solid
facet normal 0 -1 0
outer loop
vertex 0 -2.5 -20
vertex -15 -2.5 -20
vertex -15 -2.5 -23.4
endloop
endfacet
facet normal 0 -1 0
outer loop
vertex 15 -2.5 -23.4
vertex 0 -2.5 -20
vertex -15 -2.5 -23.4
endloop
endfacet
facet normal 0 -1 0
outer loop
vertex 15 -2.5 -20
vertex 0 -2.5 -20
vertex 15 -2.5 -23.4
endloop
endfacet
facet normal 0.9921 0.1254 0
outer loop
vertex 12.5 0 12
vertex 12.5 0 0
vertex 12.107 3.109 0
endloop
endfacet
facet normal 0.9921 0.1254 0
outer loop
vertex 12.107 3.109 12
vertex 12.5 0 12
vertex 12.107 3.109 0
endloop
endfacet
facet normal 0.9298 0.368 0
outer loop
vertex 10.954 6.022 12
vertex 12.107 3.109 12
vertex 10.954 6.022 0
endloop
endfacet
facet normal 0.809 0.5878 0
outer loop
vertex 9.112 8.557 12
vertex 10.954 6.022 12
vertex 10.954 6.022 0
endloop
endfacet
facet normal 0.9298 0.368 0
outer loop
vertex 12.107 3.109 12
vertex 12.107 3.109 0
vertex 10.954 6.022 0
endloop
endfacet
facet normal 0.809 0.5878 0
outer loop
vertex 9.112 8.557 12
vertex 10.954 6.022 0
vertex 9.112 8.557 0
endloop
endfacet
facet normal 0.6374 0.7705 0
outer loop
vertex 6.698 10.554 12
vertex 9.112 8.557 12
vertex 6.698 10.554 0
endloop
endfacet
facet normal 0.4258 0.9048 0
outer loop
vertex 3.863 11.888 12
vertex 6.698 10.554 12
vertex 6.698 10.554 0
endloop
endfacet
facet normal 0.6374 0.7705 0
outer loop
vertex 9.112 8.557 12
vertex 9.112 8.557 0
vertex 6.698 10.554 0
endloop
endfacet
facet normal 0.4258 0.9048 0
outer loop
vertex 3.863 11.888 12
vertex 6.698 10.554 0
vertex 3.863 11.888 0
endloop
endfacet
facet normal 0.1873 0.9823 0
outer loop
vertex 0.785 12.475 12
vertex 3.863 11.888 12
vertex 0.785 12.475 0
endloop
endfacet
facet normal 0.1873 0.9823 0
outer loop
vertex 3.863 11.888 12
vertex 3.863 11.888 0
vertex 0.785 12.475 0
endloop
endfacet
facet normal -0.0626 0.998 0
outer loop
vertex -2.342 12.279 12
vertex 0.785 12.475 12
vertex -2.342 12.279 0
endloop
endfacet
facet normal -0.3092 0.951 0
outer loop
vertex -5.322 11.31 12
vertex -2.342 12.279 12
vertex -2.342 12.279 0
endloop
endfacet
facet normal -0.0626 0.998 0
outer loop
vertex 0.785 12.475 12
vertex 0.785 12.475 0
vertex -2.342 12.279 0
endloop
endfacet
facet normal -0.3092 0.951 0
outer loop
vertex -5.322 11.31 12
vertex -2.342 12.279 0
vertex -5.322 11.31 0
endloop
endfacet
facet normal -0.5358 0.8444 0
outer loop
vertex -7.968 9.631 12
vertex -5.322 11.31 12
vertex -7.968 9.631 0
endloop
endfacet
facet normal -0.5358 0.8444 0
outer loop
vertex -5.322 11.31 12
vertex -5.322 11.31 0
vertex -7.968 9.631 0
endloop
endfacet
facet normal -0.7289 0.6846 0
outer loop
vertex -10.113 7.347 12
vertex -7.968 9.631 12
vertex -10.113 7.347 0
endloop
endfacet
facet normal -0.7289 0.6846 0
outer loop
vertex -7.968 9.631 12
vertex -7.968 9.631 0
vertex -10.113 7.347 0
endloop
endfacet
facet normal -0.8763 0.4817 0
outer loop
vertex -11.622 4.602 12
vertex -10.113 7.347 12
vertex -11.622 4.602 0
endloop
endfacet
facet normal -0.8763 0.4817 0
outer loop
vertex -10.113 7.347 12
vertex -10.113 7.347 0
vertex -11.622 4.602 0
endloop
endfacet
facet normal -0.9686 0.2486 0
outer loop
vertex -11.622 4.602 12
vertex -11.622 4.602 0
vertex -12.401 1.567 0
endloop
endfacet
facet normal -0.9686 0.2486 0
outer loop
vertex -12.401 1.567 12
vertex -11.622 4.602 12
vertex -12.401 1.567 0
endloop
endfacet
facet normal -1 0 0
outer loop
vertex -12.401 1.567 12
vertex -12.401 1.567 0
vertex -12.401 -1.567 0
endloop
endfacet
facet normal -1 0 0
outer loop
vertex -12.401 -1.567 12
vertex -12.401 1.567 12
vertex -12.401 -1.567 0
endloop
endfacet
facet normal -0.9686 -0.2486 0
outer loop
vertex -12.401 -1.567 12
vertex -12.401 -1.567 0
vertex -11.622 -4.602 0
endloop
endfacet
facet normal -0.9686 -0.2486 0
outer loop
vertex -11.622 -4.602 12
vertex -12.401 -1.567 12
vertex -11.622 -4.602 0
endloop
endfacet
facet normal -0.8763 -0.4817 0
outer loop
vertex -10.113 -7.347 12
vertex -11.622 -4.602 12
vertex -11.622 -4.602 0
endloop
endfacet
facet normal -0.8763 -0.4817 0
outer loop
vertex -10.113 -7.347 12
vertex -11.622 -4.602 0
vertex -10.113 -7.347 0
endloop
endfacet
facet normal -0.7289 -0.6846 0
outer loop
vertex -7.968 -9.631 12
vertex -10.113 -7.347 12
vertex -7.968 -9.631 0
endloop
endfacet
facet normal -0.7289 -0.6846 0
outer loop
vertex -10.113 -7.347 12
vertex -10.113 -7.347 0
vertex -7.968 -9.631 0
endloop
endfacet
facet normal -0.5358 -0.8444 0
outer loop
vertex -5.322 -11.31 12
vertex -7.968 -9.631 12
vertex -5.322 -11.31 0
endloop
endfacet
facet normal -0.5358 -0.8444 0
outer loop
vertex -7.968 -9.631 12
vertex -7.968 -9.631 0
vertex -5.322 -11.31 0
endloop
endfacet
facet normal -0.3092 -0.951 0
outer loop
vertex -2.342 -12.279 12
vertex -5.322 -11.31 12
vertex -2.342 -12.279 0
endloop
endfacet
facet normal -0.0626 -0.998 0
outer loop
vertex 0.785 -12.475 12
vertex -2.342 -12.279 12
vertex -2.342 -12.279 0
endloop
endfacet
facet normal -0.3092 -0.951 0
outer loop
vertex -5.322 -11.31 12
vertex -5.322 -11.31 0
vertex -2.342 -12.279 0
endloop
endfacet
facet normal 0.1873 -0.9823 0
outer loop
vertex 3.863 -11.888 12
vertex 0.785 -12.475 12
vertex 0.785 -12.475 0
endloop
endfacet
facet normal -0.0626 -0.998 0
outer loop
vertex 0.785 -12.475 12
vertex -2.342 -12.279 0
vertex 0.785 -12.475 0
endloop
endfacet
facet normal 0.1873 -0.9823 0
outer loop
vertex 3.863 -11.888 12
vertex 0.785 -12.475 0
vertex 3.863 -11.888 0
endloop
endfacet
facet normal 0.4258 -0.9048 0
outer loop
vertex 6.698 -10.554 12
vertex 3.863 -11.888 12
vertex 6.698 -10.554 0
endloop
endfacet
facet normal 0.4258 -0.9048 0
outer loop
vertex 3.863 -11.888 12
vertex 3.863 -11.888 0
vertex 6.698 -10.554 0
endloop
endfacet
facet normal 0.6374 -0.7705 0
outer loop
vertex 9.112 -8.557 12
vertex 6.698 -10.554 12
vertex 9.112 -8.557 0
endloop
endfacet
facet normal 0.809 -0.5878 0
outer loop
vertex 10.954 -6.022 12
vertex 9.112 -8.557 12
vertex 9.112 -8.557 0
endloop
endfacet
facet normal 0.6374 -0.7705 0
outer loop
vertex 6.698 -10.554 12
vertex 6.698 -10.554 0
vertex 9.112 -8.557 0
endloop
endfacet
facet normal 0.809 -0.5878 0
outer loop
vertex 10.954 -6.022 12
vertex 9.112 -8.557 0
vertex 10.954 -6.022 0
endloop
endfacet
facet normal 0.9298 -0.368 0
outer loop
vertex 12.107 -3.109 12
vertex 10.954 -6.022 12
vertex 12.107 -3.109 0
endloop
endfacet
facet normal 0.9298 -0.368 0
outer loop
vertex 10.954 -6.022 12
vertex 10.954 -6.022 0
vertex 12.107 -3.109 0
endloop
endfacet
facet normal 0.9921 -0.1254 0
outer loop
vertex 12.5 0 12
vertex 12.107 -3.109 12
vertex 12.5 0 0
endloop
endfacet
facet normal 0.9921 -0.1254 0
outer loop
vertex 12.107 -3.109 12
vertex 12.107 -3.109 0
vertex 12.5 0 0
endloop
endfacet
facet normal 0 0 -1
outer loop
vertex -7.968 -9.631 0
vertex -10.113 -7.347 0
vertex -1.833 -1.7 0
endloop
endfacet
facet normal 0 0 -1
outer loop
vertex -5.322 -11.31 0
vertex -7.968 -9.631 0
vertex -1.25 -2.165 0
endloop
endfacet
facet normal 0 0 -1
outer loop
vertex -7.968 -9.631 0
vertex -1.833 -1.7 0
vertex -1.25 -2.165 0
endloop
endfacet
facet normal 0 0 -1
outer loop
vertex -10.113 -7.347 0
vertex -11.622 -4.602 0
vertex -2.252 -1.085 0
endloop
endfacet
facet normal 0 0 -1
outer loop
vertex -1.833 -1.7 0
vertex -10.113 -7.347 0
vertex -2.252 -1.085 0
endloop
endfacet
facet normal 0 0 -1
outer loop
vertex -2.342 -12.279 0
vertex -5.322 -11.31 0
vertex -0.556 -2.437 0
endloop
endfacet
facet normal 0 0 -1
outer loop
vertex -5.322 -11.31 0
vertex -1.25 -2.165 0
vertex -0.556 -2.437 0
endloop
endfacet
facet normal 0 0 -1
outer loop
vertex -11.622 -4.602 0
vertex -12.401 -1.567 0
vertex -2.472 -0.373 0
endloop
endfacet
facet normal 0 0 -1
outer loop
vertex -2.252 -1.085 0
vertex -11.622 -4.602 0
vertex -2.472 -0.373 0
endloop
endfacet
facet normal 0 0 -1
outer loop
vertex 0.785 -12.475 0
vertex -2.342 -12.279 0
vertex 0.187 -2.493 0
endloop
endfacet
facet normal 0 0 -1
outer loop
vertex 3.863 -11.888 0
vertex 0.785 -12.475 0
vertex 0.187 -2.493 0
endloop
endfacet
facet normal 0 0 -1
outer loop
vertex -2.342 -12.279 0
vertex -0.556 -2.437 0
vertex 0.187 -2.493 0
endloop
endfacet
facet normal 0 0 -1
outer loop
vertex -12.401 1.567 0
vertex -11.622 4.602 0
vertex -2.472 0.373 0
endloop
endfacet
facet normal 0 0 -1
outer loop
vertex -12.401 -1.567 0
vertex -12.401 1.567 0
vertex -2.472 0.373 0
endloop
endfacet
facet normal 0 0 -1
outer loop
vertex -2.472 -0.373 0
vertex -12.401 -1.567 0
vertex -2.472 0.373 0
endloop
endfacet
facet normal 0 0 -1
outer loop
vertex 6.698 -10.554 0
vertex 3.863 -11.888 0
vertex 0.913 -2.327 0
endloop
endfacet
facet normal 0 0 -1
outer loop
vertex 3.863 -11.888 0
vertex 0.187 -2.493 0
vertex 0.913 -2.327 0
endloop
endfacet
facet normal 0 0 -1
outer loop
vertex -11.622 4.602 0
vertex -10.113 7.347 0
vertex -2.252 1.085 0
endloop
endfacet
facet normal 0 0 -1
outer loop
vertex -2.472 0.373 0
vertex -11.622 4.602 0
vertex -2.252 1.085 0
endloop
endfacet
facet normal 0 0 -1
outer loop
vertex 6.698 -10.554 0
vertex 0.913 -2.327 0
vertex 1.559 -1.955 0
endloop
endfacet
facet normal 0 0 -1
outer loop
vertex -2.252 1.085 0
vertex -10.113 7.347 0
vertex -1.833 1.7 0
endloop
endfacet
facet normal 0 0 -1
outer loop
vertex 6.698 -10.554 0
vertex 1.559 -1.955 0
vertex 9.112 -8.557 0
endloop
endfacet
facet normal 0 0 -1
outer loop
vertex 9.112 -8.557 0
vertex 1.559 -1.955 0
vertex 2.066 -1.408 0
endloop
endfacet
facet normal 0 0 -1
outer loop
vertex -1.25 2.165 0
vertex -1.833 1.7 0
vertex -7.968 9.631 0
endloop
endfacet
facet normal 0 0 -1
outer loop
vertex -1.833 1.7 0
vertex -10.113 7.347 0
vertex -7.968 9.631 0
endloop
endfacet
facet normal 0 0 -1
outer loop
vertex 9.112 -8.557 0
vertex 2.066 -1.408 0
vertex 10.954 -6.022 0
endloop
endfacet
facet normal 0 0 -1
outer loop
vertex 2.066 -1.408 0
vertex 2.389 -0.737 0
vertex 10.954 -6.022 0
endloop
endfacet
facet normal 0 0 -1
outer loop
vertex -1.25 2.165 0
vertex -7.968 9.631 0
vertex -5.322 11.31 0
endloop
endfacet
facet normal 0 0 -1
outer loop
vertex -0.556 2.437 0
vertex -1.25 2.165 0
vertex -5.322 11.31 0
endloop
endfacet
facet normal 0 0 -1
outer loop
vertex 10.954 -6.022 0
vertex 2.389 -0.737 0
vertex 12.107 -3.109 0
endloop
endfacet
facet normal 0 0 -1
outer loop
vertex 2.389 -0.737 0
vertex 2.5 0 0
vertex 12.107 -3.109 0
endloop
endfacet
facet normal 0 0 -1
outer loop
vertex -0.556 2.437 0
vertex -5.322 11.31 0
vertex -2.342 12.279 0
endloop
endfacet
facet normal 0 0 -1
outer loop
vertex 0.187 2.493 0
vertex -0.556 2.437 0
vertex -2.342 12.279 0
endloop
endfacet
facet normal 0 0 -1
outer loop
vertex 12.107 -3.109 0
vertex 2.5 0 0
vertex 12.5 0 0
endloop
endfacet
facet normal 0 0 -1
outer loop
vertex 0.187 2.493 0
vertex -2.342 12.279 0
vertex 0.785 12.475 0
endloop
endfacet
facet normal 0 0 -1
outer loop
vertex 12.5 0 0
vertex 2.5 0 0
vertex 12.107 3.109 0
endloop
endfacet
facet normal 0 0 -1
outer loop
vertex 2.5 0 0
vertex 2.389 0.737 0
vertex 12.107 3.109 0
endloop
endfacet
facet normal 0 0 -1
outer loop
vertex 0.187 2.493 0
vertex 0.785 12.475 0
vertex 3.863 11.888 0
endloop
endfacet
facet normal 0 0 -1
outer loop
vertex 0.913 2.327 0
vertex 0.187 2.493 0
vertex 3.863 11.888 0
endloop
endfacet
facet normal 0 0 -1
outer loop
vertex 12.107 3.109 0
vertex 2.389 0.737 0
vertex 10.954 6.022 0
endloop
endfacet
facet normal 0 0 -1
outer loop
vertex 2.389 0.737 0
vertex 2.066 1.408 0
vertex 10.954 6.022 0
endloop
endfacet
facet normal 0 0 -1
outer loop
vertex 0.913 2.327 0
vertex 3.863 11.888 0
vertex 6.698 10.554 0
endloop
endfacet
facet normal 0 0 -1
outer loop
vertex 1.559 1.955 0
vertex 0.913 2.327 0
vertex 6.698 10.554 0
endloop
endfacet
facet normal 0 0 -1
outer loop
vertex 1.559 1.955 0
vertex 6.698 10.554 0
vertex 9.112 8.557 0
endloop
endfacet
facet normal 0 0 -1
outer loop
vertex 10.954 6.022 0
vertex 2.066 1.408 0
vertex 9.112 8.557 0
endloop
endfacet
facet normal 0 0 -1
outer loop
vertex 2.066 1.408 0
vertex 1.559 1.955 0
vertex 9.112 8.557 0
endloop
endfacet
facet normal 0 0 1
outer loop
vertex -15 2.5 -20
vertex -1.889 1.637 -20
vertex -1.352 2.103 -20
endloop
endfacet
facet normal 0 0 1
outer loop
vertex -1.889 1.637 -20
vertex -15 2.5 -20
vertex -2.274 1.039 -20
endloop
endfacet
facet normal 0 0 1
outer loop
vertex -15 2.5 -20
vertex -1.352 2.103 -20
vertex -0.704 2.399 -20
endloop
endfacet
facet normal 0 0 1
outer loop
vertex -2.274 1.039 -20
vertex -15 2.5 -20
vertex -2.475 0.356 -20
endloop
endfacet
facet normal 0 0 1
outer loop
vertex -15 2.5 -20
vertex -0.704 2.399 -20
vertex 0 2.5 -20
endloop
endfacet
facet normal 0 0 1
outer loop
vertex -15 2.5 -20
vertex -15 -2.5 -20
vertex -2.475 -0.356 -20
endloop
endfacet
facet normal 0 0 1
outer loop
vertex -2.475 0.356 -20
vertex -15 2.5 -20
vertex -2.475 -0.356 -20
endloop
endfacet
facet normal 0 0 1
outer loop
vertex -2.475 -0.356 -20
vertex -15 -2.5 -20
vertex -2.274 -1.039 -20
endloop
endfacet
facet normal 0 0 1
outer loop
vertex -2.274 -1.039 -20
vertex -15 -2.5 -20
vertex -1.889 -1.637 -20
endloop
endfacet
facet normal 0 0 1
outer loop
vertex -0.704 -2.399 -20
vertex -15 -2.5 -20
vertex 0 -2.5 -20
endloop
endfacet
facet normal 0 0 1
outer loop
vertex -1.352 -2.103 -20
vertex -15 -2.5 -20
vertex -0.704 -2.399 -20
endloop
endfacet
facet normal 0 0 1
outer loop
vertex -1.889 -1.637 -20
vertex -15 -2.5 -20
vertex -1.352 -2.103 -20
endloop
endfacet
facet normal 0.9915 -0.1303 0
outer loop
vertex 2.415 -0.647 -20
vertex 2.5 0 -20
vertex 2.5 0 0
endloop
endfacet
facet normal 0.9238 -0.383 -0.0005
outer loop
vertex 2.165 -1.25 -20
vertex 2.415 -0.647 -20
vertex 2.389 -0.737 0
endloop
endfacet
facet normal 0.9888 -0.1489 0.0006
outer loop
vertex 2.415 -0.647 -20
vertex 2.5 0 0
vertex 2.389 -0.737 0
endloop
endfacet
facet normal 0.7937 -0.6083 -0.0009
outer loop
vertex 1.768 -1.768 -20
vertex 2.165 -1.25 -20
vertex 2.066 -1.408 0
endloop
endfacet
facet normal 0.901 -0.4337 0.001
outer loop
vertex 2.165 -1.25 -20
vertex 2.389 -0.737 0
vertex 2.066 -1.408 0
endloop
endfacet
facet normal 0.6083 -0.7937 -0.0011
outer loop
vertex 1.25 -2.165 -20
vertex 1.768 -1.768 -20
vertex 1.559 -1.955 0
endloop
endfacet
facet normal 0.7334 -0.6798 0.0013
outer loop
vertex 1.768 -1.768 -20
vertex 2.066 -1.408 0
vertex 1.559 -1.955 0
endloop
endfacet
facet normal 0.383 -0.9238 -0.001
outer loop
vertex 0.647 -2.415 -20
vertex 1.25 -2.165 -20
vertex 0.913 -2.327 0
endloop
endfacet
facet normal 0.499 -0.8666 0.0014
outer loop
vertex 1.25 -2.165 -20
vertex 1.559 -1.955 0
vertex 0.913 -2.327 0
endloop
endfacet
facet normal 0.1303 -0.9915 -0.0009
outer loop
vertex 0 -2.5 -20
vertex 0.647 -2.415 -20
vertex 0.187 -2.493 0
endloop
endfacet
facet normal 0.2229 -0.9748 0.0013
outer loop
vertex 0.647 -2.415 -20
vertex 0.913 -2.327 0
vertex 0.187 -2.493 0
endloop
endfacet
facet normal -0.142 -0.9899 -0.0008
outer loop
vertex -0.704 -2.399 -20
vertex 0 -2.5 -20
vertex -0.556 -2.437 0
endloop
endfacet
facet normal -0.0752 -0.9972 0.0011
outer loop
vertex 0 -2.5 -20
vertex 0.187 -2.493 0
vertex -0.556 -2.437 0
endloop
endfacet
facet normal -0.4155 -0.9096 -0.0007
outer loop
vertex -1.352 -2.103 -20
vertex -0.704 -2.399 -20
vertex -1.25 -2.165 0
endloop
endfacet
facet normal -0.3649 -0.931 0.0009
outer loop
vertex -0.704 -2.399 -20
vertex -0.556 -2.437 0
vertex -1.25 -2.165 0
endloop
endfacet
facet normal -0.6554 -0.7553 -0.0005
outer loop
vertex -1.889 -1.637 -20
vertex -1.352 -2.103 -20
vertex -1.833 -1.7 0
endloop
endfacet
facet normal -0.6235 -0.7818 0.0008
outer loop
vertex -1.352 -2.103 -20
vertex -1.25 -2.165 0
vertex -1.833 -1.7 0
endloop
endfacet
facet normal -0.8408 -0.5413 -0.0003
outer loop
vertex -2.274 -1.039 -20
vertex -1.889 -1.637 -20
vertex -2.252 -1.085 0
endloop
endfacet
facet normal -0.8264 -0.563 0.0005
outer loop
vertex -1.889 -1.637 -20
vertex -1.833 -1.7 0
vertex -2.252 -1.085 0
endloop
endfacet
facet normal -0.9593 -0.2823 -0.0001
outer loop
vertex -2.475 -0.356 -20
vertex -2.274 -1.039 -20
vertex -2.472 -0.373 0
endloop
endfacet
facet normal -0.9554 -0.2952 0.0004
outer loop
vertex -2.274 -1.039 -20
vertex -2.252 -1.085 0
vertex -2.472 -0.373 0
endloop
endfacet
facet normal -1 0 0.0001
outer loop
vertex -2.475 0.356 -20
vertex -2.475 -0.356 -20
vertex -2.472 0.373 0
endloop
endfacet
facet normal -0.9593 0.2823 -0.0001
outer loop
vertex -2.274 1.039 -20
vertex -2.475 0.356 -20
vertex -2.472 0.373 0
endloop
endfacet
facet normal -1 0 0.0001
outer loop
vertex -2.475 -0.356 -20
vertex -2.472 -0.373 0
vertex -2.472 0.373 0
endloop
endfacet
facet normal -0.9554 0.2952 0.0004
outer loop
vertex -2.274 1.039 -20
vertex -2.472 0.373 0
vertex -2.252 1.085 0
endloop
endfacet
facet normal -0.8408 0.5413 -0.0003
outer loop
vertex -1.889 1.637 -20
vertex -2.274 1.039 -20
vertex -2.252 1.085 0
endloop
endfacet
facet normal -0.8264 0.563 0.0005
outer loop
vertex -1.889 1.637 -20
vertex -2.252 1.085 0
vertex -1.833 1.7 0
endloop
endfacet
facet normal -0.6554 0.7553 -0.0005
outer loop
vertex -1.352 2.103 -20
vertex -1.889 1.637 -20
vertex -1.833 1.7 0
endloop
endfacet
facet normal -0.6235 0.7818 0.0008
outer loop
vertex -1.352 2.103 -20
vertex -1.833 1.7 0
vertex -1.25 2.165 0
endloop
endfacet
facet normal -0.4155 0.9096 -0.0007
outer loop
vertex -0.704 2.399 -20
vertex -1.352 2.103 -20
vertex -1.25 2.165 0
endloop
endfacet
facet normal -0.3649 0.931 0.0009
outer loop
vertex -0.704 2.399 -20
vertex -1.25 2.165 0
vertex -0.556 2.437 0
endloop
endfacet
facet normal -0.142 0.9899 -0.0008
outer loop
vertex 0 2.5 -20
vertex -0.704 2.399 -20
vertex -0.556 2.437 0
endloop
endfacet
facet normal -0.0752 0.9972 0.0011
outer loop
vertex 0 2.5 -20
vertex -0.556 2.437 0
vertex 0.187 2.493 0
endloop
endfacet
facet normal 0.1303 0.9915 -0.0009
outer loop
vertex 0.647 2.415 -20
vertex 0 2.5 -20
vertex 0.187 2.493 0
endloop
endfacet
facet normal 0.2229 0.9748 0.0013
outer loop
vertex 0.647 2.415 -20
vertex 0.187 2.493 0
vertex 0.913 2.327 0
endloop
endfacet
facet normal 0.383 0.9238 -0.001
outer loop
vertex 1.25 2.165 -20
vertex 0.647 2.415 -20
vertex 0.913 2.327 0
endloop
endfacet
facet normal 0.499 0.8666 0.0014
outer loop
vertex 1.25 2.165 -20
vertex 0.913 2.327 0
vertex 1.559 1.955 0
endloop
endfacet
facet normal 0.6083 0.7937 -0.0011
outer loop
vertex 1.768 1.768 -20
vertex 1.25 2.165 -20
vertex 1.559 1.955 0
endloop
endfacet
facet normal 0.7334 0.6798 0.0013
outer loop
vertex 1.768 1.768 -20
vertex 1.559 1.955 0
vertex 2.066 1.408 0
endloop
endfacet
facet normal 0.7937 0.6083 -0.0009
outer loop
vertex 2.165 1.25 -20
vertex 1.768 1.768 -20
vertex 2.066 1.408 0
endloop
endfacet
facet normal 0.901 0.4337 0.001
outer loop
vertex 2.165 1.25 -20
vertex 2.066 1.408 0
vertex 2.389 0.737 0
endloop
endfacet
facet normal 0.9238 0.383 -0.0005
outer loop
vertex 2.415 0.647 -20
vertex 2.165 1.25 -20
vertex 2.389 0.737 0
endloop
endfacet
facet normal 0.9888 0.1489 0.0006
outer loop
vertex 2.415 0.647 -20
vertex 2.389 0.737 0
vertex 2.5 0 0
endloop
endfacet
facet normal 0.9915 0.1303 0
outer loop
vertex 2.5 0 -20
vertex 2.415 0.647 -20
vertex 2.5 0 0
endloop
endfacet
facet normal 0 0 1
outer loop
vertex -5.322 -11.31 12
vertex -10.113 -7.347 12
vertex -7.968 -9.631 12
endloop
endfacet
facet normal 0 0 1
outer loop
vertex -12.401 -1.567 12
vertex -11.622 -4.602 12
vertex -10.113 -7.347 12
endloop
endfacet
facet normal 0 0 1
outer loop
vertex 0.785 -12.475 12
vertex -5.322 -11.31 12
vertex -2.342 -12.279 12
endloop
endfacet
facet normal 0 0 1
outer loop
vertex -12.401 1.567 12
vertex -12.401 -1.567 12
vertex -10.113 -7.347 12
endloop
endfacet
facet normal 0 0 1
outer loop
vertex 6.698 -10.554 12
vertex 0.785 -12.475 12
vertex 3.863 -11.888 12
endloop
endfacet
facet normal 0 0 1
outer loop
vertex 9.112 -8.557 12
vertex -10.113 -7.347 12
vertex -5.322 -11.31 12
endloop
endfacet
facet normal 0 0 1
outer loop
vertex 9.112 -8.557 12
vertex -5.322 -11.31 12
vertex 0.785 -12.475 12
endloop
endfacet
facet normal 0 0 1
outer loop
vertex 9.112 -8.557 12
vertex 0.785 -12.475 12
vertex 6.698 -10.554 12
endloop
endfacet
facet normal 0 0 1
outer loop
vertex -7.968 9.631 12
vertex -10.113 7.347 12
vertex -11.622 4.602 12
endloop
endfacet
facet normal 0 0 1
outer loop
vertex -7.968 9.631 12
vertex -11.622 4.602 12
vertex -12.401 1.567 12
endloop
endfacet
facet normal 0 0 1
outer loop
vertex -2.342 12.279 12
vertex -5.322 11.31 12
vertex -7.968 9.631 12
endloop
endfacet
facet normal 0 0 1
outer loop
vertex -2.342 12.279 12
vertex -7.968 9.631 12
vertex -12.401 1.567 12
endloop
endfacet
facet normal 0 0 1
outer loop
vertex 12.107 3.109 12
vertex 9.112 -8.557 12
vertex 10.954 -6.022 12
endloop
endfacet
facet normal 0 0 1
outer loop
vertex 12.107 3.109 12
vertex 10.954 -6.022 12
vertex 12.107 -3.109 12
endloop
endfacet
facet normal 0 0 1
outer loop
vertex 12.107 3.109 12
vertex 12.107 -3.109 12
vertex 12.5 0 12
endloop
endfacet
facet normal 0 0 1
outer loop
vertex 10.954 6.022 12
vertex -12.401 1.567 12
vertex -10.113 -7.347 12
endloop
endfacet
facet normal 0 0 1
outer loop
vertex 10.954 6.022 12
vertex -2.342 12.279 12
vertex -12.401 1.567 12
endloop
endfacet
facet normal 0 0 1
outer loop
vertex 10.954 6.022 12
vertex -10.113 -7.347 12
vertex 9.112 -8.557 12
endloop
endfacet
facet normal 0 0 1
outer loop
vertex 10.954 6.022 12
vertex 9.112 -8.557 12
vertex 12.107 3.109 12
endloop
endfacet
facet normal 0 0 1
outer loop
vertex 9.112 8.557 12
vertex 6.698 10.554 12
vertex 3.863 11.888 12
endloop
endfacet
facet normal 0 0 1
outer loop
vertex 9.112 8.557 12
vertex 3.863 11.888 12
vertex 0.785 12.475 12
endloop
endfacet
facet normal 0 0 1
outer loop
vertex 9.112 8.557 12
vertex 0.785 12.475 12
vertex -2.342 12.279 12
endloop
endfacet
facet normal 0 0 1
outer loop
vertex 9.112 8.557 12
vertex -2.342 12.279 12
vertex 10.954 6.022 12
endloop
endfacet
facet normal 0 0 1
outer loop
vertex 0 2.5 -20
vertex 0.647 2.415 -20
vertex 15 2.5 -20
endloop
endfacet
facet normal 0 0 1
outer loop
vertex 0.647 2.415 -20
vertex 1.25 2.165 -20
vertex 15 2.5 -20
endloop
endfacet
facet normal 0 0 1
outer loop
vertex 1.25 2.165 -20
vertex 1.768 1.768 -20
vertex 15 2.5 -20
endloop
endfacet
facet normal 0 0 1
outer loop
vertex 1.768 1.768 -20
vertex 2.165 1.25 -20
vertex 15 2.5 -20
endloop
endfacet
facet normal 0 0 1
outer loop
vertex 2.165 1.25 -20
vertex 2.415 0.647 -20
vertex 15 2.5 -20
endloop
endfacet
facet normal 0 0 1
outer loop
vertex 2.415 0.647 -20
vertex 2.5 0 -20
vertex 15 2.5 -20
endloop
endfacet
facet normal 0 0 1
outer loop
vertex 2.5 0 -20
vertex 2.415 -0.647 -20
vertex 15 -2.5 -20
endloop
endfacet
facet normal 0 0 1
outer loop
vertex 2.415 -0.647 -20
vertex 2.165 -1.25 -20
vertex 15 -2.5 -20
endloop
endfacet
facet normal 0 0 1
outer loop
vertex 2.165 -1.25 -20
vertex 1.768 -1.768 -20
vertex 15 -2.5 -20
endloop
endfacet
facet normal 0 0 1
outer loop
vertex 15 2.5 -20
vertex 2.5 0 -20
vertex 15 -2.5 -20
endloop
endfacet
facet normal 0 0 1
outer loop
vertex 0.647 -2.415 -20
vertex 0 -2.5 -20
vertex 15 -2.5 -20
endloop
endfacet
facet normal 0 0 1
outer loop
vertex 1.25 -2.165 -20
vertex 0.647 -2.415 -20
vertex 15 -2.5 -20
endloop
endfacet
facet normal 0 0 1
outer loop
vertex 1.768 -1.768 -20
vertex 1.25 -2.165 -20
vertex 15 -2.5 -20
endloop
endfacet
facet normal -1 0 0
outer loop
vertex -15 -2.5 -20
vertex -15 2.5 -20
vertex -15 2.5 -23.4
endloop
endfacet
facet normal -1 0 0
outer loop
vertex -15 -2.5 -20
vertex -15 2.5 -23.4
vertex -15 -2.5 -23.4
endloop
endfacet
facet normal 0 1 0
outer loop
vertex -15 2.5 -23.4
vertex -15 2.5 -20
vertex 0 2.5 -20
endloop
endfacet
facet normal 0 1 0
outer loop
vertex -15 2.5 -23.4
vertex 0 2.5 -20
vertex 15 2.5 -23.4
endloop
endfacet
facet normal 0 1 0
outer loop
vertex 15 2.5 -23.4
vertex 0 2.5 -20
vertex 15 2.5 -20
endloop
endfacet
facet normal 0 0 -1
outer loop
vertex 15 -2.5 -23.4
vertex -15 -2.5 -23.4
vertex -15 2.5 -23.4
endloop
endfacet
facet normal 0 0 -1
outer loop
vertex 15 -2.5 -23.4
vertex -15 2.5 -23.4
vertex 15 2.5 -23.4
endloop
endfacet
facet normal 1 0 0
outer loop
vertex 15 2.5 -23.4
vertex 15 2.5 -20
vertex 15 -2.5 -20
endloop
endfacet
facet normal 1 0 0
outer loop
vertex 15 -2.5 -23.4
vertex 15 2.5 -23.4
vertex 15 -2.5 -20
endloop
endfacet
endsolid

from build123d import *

# Parameters (mm, degrees)
F0_R     = 12.5
F1_DEPTH = 12
F2_R     = 2.5
F3_DEPTH = 20
F4_W     = 30
F4_H     = 5
F5_DEPTH = 3.4


with BuildPart() as f1:
    # F0 (on Top) → F1 (new body)
    with BuildSketch(Plane.XY):
        Circle(F0_R)
    extrude(amount=F1_DEPTH)

    # F2 (on face) → F3 (join)
    with BuildSketch(Plane(origin=(0, 0, 0), x_dir=(1, 0, 0), z_dir=(0, 0, -1))):
        Circle(F2_R)
    extrude(amount=F3_DEPTH)

    # F4 (on face) → F5 (join)
    with BuildSketch(Plane(origin=(0, 0, -20), x_dir=(1, 0, 0), z_dir=(0, 0, -1))):
        Rectangle(F4_W, F4_H)
    extrude(amount=F5_DEPTH)


solid = f1.part
